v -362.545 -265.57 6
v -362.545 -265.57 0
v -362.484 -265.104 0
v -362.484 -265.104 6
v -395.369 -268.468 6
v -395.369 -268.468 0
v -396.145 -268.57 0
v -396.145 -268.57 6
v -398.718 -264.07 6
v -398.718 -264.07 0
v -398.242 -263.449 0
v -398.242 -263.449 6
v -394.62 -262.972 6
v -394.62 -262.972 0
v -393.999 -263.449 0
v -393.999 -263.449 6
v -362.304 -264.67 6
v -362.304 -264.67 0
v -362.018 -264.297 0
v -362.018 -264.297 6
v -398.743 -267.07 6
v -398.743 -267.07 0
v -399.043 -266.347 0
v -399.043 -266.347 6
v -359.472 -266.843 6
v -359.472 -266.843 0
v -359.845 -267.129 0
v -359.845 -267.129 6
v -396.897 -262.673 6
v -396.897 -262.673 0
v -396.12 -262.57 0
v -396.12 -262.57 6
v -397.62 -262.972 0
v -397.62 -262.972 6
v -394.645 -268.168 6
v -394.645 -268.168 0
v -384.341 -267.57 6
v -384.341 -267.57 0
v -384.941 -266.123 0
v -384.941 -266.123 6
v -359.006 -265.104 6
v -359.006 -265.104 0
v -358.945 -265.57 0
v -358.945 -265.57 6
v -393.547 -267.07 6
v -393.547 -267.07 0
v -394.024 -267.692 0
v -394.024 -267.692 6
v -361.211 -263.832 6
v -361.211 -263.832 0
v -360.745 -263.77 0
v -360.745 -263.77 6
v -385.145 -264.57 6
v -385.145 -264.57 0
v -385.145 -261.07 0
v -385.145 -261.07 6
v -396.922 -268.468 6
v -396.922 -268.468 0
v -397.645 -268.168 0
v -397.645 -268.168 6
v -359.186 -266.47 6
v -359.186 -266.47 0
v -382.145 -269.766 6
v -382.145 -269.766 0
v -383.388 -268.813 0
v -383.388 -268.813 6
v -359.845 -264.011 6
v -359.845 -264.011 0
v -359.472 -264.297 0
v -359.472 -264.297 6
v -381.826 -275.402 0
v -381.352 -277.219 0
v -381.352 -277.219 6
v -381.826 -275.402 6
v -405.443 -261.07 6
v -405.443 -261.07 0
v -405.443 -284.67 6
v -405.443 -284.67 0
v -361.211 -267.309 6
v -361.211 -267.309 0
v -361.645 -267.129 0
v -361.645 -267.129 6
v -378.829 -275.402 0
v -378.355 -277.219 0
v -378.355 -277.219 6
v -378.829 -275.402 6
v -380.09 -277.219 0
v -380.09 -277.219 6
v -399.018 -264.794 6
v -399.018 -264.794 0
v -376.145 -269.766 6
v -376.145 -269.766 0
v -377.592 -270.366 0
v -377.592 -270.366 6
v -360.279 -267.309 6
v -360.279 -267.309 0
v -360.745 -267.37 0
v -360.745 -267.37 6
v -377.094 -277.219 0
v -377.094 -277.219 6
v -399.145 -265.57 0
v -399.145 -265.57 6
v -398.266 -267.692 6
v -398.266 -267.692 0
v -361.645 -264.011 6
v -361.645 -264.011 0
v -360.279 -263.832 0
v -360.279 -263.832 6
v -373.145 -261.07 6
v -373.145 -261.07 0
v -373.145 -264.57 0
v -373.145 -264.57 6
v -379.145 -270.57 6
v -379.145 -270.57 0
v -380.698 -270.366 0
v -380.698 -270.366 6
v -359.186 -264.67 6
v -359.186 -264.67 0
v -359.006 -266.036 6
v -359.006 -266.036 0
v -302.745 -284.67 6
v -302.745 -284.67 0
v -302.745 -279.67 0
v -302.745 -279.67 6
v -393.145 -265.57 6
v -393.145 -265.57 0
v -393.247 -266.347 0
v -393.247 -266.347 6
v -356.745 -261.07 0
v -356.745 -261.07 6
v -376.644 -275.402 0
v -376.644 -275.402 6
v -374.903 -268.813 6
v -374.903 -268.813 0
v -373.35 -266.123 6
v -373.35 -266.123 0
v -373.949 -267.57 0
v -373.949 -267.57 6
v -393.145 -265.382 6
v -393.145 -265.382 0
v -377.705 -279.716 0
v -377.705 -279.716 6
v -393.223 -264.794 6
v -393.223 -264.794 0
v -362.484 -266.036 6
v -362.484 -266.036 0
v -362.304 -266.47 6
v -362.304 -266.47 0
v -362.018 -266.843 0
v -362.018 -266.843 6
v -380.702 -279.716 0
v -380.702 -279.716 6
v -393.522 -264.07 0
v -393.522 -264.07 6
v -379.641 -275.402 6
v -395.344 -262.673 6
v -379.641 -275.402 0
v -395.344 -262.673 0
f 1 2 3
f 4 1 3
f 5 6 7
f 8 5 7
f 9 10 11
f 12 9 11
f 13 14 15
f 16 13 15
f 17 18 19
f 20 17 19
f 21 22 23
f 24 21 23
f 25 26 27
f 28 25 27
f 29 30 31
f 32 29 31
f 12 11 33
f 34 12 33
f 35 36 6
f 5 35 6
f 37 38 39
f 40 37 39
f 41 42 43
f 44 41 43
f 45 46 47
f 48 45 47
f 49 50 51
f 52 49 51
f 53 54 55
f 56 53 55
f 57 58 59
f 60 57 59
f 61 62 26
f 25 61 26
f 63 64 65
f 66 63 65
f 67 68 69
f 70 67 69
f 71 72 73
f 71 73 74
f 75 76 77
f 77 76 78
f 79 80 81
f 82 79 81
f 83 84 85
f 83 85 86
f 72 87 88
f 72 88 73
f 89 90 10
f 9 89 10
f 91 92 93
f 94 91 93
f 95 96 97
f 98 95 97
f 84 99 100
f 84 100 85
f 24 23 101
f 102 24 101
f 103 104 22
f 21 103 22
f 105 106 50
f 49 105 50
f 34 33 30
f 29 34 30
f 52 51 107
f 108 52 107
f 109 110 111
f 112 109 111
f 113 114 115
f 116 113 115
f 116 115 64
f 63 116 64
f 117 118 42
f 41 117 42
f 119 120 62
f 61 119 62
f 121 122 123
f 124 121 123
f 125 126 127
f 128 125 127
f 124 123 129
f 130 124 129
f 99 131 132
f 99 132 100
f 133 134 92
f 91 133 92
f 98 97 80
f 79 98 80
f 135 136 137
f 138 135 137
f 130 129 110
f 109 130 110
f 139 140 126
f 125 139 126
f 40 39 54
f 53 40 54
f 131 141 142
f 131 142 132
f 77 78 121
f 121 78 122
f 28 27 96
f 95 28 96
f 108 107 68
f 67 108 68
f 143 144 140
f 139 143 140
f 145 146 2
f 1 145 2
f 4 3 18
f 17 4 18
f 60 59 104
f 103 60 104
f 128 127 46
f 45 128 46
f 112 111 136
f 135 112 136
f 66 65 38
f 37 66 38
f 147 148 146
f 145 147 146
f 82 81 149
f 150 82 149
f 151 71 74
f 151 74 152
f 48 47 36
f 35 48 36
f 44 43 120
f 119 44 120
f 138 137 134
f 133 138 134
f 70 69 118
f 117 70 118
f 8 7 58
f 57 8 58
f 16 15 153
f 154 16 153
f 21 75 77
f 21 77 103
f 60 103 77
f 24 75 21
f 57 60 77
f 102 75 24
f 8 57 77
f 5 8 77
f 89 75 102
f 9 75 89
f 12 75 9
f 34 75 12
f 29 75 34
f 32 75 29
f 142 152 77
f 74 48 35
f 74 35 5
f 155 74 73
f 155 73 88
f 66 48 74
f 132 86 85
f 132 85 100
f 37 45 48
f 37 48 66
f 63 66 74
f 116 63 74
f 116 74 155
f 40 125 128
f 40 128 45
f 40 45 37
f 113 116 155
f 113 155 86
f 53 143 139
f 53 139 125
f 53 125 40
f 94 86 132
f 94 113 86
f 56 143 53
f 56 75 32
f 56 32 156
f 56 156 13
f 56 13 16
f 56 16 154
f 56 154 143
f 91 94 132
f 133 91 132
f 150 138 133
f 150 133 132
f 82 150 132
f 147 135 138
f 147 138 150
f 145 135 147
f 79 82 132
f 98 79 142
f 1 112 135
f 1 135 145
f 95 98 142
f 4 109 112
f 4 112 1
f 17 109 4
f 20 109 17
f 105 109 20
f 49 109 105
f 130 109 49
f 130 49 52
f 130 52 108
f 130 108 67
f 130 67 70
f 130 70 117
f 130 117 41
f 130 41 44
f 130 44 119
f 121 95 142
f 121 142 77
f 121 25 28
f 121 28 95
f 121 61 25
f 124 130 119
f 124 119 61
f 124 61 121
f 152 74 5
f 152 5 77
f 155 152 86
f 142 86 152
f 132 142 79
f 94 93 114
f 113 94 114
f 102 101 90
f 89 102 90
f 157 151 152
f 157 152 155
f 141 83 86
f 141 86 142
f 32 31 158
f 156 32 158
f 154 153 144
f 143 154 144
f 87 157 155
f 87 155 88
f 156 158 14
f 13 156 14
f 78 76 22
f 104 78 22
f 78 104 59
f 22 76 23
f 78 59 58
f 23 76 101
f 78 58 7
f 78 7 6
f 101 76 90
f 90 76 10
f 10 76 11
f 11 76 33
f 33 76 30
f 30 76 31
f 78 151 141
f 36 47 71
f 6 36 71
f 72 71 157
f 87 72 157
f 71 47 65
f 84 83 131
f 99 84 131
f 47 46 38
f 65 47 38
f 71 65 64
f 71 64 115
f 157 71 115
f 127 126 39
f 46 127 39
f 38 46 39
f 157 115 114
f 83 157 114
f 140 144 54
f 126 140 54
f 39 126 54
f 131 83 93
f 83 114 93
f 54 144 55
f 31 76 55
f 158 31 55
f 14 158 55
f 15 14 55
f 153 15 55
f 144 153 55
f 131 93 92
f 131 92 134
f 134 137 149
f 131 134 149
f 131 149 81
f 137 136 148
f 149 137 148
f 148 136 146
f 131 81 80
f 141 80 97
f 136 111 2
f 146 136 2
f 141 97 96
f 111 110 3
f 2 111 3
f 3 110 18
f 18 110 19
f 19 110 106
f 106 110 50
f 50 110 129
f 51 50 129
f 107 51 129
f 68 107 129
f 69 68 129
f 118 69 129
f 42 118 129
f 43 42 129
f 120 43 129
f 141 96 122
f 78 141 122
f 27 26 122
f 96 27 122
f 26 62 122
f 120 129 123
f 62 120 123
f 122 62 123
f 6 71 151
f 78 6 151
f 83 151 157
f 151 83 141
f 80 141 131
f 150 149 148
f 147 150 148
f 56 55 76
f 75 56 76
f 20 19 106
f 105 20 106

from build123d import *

# Parameters (mm, degrees)
BOSS_EXTRUDE1_DEPTH = 6


with BuildPart() as part:
    # Sketch1 → Boss-Extrude1 (new body)
    with BuildSketch(Plane.XY):
        Polygon((-380.698066711, -270.365836794), (-382.14515244, -269.766434259), (-383.387793127, -268.812922523), (-384.341304863, -267.570281836), (-384.940707398, -266.123196107), (-385.14515244, -264.570281836), (-385.14515244, -261.070281836), (-405.443422321, -261.070281836), (-405.443422321, -284.670281836), (-302.74515244, -284.670281836), (-302.74515244, -279.670281836), (-356.74515244, -261.070281836), (-373.14515244, -261.070281836), (-373.14515244, -264.570281836), (-373.349597482, -266.123196107), (-373.949000017, -267.570281836), (-374.902511753, -268.812922523), (-376.14515244, -269.766434259), (-377.59223817, -270.365836794), (-379.14515244, -270.570281836), align=None)
        Polygon((-359.84515244, -267.129127563), (-360.279278159, -267.308948324), (-360.74515244, -267.370281836), (-361.211026721, -267.308948324), (-361.64515244, -267.129127563), (-362.017944646, -266.843074042), (-362.303998167, -266.470281836), (-362.483818927, -266.036156118), (-362.54515244, -265.570281836), (-362.483818927, -265.104407555), (-362.303998167, -264.670281836), (-362.017944646, -264.29748963), (-361.64515244, -264.01143611), (-361.211026721, -263.831615349), (-360.74515244, -263.770281836), (-360.279278159, -263.831615349), (-359.84515244, -264.01143611), (-359.472360234, -264.29748963), (-359.186306713, -264.670281836), (-359.006485953, -265.104407555), (-358.94515244, -265.570281836), (-359.006485953, -266.036156118), (-359.186306713, -266.470281836), (-359.472360234, -266.843074042), align=None, mode=Mode.SUBTRACT)
        Polygon((-397.620355238, -262.972205625), (-396.896812373, -262.672504357), (-396.120355238, -262.570281836), (-395.343898102, -262.672504357), (-394.620355238, -262.972205625), (-393.999034894, -263.448961493), (-393.522279026, -264.070281836), (-393.222577759, -264.793824701), (-393.14515244, -265.381928384), (-393.14515244, -265.570281836), (-393.247374961, -266.346738972), (-393.547076229, -267.070281836), (-394.023832097, -267.69160218), (-394.64515244, -268.168358048), (-395.368695305, -268.468059315), (-396.14515244, -268.570281836), (-396.921609575, -268.468059315), (-397.64515244, -268.168358048), (-398.266472784, -267.69160218), (-398.743228652, -267.070281836), (-399.042929919, -266.346738972), (-399.14515244, -265.570281836), (-399.018132717, -264.793824701), (-398.718431449, -264.070281836), (-398.241675581, -263.448961493), align=None, mode=Mode.SUBTRACT)
        Polygon((-378.829308223, -275.402326901), (-377.705403878, -279.716351292), (-376.643951896, -275.402326901), (-377.093504107, -277.219304798), (-378.354794122, -277.219304798), align=None, mode=Mode.SUBTRACT)
        Polygon((-381.826259442, -275.402326901), (-380.702355098, -279.716351292), (-379.640903116, -275.402326901), (-380.090455326, -277.219304798), (-381.351745342, -277.219304798), align=None, mode=Mode.SUBTRACT)
    extrude(amount=BOSS_EXTRUDE1_DEPTH)


solid = part.part
